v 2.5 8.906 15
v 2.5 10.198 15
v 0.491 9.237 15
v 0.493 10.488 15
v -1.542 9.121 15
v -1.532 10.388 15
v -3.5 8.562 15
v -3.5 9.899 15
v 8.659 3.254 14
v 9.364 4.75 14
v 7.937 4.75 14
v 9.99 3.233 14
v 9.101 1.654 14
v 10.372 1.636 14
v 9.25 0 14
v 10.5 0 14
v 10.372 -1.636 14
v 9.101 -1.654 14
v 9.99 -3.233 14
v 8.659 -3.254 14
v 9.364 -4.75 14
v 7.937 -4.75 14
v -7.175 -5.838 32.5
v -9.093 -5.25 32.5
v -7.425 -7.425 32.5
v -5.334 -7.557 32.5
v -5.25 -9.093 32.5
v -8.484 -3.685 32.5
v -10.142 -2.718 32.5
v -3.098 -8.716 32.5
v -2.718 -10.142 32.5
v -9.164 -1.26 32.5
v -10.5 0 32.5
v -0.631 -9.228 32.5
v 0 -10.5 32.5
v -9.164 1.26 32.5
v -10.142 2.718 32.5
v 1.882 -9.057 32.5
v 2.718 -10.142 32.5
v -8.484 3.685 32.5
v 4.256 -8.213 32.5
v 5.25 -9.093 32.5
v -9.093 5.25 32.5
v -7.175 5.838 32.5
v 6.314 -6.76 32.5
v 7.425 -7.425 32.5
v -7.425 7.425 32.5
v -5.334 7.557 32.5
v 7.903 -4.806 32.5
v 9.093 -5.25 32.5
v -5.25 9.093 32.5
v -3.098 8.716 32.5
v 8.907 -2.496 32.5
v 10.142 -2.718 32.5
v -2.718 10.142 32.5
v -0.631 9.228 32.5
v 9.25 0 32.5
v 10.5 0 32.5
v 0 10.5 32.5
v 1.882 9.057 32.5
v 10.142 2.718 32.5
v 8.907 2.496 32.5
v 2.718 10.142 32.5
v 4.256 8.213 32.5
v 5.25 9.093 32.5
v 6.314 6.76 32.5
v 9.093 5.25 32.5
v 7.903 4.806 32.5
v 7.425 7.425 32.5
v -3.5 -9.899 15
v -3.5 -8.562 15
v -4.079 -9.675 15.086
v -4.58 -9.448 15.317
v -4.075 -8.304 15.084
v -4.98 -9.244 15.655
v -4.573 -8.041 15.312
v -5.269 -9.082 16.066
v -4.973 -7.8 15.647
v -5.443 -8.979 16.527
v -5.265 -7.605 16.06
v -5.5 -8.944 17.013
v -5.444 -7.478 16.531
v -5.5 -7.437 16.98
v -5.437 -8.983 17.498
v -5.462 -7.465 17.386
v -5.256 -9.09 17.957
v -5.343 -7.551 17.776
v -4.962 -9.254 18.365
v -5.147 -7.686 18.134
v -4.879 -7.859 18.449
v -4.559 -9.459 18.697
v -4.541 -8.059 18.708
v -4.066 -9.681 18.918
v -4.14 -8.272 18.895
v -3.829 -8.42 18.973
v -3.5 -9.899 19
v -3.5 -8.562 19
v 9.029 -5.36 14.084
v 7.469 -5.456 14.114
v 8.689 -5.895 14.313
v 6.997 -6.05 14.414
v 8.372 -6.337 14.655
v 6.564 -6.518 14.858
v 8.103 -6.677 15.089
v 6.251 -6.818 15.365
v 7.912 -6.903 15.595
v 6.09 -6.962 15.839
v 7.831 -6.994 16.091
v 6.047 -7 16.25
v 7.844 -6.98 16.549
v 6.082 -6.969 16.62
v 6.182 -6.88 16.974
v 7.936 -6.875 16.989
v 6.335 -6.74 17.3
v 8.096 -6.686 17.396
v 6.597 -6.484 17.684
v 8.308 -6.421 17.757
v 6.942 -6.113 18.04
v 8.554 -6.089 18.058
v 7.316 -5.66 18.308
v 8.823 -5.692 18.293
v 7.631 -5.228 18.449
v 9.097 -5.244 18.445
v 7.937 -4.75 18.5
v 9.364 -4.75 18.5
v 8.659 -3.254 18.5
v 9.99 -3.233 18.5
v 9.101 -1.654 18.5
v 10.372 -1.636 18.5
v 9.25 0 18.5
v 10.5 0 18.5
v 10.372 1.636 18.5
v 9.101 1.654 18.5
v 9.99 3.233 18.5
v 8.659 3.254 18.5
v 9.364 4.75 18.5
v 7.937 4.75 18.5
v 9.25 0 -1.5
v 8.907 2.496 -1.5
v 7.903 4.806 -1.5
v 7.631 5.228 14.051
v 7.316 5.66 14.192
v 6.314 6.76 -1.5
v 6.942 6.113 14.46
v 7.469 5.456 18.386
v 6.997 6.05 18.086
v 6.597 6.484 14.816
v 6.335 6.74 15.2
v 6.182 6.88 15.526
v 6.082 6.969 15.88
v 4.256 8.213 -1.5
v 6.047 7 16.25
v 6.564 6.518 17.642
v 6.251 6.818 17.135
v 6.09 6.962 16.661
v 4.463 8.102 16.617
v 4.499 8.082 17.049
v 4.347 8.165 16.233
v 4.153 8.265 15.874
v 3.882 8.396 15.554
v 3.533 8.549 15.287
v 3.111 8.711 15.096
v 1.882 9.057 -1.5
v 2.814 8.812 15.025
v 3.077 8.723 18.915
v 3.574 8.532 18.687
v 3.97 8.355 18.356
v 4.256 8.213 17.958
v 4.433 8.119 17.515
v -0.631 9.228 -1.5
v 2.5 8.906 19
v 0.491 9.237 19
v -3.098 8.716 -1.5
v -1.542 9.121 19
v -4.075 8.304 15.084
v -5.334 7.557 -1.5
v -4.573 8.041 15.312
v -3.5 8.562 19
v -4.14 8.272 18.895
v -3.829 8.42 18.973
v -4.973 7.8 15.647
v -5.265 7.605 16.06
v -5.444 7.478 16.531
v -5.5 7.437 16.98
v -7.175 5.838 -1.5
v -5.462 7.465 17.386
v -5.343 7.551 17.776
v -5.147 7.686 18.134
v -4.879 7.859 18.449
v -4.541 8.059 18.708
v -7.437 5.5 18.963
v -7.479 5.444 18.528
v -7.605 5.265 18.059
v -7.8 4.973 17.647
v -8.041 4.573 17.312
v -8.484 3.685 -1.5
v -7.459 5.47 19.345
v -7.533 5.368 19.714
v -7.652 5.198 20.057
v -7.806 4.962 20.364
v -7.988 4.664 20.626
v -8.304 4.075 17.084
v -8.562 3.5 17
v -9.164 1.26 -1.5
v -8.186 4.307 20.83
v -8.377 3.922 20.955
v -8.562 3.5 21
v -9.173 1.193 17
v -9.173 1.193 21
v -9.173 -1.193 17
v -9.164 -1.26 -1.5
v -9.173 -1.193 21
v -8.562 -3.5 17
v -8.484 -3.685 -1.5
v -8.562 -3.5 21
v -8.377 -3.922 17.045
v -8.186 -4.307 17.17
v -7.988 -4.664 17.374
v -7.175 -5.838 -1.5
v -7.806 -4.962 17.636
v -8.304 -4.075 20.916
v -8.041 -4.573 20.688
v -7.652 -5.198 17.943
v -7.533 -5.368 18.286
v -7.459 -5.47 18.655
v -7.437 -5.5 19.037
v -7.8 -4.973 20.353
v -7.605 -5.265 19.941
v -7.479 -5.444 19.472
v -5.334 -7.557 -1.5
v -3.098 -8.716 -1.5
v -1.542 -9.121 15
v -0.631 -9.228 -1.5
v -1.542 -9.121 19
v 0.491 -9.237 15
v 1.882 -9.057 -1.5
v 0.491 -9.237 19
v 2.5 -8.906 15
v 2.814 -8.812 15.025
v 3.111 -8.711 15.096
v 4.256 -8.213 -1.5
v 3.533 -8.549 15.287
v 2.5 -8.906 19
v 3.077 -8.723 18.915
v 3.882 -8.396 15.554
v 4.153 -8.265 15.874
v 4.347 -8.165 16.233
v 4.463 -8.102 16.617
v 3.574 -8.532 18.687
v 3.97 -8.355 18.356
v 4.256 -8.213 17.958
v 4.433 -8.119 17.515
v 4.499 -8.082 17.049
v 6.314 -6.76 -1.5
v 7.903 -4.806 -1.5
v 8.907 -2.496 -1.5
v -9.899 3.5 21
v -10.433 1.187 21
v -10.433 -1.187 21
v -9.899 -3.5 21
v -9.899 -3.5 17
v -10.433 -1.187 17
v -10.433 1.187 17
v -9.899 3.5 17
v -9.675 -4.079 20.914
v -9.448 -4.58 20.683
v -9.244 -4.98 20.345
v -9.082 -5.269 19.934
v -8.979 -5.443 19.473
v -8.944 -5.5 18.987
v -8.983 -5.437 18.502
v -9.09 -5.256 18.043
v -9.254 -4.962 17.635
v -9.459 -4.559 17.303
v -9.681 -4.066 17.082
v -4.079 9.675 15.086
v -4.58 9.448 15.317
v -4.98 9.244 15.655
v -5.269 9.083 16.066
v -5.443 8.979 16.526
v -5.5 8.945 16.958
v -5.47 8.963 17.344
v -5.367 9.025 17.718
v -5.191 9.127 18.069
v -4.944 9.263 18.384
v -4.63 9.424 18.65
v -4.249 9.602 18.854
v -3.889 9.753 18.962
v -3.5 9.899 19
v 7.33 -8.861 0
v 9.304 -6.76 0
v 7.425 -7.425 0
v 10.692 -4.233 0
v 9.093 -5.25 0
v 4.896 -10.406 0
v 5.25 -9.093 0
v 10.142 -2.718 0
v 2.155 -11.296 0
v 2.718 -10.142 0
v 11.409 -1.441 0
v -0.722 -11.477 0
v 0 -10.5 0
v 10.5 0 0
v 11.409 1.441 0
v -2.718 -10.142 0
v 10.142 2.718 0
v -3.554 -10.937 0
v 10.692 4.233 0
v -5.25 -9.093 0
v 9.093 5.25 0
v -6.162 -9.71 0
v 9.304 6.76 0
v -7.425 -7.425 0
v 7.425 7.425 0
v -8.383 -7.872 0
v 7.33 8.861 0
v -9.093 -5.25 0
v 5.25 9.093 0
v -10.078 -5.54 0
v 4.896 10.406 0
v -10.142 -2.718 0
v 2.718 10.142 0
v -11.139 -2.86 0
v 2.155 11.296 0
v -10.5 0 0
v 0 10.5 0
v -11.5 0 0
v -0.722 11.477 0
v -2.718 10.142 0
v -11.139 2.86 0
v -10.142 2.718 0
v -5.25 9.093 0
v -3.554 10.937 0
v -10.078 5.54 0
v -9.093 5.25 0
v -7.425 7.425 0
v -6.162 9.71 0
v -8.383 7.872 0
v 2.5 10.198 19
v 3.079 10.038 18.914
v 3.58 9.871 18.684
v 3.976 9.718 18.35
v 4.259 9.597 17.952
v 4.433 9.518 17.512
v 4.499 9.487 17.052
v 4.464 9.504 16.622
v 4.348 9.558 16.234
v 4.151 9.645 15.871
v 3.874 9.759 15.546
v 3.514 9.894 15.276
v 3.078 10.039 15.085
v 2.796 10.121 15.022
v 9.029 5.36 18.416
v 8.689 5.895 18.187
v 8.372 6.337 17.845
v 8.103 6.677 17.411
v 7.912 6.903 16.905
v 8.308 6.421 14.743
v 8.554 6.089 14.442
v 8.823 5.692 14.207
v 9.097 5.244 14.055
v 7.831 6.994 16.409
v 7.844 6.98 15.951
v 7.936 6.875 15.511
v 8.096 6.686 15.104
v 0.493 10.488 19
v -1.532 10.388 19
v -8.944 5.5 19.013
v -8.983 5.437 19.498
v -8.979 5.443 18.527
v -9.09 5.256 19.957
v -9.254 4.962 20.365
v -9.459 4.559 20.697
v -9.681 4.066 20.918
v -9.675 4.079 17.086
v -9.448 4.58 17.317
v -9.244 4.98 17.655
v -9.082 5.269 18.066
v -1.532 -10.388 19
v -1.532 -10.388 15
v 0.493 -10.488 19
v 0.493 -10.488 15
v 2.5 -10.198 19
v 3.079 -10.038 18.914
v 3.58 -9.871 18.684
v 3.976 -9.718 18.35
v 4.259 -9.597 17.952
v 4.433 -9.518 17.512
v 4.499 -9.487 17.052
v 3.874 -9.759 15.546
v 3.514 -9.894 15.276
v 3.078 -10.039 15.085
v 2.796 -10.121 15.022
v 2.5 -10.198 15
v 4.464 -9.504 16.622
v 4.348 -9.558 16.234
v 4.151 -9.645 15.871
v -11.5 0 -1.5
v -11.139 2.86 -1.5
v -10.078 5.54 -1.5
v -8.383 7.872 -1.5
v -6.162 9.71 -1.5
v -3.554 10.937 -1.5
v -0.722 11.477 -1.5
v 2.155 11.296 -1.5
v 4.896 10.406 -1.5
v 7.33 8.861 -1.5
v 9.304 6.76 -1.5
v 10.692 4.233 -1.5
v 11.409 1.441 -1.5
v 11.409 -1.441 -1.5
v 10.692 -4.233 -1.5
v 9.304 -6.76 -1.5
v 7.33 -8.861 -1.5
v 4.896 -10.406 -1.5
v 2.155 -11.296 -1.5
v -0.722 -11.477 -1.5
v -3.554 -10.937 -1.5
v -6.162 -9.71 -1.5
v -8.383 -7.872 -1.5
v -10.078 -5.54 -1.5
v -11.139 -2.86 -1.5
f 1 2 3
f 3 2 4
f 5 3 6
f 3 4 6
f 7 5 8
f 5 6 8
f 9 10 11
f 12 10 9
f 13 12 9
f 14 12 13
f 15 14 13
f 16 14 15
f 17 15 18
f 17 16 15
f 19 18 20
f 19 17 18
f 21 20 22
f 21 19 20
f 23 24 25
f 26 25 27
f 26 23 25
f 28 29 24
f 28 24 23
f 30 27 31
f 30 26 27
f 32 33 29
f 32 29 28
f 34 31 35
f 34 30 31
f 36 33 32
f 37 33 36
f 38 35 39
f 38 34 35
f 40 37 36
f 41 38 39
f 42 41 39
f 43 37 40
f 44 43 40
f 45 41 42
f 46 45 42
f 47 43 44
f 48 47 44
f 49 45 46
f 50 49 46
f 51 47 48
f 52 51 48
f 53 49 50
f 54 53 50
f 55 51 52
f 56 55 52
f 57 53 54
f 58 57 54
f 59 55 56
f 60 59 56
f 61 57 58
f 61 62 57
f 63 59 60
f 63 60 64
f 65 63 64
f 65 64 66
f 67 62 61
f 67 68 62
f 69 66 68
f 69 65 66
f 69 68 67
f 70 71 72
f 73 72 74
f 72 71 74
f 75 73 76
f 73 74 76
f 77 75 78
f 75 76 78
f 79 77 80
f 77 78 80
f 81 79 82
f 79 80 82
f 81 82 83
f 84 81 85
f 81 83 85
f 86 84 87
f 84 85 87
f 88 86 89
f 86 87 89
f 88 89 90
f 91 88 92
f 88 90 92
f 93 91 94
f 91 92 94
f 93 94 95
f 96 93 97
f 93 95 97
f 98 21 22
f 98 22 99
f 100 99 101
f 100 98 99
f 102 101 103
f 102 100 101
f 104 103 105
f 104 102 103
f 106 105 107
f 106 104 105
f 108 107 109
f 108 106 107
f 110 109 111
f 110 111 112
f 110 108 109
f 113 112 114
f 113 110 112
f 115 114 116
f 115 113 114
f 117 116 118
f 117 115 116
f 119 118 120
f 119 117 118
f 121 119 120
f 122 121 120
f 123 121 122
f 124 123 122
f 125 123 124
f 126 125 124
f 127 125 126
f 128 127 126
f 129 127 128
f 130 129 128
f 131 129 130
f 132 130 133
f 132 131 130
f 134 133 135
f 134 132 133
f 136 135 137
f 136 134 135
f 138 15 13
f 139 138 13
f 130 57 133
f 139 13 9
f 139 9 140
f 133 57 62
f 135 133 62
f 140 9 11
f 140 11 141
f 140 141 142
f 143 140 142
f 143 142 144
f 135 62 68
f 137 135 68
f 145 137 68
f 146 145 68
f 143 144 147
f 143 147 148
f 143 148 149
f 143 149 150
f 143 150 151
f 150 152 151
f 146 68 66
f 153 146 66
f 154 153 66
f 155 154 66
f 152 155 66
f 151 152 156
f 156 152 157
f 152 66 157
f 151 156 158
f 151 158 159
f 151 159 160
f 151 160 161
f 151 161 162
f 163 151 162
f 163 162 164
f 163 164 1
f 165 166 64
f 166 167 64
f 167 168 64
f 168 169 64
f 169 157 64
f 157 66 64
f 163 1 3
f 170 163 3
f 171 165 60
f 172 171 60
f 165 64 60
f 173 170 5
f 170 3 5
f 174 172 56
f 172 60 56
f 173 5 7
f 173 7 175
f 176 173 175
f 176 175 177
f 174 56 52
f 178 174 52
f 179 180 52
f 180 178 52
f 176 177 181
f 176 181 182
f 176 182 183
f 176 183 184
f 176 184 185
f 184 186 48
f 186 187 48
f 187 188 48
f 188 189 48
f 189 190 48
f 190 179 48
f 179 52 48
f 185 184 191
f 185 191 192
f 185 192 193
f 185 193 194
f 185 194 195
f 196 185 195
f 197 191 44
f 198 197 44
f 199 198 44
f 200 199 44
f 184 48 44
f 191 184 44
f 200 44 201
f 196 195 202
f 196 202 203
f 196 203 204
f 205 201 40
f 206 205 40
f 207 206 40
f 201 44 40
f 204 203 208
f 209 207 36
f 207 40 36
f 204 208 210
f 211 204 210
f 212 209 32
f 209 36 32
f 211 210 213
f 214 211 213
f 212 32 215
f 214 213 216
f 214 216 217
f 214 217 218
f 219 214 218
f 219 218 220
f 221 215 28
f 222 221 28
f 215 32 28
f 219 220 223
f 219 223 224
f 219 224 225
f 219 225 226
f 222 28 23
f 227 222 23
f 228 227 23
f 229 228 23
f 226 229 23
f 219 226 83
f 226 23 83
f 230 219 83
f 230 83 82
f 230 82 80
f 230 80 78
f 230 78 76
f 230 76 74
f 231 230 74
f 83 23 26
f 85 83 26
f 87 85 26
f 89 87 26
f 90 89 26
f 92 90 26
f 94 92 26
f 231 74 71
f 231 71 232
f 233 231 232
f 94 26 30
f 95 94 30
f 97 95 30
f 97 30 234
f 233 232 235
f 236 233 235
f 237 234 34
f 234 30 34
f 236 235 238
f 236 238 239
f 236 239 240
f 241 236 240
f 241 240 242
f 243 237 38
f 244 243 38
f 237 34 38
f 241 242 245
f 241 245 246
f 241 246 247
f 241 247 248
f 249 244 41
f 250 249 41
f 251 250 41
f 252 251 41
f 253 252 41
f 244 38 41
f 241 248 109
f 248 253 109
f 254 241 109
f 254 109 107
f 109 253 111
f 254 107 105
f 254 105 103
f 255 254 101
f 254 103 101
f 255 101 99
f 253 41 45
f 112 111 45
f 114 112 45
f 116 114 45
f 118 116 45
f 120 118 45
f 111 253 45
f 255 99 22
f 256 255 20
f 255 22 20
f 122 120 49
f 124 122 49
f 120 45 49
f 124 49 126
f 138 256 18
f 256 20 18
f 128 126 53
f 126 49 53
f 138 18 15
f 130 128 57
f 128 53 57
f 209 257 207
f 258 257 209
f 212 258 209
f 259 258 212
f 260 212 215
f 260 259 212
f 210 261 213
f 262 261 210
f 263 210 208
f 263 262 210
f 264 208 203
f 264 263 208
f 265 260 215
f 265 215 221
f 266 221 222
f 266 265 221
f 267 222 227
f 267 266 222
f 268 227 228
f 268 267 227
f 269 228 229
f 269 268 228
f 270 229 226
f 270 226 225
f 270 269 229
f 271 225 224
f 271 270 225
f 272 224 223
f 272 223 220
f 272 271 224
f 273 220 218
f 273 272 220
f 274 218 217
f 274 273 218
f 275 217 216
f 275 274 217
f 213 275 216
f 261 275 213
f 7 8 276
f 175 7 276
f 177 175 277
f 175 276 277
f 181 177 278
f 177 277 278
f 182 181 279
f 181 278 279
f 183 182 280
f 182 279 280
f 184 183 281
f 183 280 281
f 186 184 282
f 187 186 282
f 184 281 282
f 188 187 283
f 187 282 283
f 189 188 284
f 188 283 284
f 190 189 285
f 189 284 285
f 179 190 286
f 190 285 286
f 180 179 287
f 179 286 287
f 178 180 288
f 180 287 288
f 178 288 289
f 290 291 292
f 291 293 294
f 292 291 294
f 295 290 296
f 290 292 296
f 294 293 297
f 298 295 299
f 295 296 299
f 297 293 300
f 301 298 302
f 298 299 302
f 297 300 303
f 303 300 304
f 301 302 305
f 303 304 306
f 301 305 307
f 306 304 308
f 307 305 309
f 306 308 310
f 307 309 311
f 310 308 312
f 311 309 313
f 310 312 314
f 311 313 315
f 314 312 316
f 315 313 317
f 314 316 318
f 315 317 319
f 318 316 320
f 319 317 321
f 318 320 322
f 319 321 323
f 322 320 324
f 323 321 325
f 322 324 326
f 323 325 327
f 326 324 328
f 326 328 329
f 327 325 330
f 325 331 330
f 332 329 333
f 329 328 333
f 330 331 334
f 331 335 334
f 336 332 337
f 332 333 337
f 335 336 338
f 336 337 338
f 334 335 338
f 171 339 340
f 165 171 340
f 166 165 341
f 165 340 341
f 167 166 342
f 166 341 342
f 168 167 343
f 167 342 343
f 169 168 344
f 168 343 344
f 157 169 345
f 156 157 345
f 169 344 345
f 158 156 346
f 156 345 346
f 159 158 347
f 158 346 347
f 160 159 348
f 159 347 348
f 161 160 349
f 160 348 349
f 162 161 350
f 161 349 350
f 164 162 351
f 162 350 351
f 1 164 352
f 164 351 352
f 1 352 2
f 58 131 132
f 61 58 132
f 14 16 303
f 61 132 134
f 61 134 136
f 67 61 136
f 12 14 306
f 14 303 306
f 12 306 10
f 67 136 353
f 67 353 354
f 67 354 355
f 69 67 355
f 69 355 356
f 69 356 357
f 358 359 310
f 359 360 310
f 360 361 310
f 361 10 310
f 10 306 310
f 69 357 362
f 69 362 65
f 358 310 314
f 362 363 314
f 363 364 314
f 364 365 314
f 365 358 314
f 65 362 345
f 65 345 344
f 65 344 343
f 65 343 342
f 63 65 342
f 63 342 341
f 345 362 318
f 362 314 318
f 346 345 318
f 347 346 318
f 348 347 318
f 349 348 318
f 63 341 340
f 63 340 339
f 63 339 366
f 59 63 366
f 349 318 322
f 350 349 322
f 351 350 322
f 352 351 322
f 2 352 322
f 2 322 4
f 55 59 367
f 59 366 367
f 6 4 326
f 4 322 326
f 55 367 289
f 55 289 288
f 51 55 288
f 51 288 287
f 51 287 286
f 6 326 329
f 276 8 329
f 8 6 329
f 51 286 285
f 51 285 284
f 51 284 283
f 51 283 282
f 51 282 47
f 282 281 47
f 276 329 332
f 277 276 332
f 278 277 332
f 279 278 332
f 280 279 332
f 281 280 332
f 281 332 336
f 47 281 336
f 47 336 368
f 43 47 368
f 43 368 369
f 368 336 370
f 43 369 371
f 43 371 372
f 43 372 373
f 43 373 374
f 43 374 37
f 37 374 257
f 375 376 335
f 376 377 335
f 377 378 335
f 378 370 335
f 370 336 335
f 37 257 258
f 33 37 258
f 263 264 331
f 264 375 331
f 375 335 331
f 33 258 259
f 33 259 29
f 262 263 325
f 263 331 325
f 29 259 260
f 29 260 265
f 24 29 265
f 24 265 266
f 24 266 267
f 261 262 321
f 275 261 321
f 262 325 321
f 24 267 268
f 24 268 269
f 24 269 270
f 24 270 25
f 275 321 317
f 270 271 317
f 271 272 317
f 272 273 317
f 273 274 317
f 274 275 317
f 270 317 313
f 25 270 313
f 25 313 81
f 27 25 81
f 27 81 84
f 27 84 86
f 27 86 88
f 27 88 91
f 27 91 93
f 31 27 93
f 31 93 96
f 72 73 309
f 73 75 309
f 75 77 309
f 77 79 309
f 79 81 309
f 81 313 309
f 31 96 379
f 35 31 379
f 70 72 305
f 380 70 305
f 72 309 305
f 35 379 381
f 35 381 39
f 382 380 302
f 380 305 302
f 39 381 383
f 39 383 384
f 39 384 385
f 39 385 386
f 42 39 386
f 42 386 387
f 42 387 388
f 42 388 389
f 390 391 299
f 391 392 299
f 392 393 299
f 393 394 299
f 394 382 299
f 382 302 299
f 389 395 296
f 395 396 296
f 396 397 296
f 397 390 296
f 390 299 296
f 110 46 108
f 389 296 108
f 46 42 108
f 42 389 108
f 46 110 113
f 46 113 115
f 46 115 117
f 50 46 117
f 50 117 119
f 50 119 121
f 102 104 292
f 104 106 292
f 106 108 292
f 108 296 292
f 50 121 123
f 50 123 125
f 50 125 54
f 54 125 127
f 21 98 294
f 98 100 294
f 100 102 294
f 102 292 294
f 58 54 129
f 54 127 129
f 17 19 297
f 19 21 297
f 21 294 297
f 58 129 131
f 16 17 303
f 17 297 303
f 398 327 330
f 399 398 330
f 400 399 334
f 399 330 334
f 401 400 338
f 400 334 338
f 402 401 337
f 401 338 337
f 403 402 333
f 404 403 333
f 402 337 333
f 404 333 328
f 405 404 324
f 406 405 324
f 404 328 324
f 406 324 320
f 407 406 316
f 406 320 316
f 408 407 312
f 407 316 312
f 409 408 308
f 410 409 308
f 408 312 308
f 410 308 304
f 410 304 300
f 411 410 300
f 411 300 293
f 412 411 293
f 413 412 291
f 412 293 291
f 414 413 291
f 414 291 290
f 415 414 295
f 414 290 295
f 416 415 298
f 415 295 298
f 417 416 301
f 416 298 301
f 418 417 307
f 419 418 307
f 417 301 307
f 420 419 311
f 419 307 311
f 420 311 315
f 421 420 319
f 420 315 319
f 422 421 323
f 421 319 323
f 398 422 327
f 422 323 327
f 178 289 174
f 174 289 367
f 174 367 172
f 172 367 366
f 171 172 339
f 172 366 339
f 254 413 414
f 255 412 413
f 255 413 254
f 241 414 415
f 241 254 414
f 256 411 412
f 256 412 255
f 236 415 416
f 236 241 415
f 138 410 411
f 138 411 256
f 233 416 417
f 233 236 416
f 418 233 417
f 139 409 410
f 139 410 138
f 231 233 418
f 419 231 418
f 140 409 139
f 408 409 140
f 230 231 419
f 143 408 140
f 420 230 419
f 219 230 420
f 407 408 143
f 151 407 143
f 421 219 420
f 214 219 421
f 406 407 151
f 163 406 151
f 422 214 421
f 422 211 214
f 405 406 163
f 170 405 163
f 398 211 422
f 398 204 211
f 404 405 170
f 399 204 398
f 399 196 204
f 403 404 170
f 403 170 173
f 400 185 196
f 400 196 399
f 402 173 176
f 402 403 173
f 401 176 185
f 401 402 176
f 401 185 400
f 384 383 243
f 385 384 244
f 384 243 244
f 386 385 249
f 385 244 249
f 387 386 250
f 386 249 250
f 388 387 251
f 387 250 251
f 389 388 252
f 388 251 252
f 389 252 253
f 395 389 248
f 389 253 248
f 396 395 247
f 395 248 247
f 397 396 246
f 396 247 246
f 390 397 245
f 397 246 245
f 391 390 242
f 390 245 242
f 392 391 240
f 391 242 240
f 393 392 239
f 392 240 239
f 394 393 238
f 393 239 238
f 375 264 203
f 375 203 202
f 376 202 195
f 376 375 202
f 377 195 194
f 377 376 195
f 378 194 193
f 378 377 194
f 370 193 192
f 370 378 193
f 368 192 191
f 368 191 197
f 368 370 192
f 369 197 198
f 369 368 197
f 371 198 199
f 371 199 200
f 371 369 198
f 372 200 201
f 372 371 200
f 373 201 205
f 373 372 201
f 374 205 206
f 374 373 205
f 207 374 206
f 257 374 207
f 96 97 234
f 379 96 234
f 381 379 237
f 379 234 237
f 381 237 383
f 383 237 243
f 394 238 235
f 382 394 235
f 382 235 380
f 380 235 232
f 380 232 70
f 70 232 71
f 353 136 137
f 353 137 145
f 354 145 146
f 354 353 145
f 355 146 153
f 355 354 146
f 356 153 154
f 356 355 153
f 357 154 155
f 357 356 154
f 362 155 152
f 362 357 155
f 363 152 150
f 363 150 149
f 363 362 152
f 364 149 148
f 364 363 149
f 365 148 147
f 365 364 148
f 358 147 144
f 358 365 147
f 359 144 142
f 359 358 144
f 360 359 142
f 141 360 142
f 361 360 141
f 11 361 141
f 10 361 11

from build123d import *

# Parameters (mm, degrees)
ESQUISSE1_R             = 10.5
BASE_EXTRUSION_DEPTH    = 32.5
ESQUISSE3_R             = 11.5
BOSS_EXTRU_1_DEPTH      = 1.5
ESQUISSE2_R             = 9.25
ENL_V_MAT_EXTRU_1_DEPTH = 38.68952109
ENL_V_MAT_EXTRU_2_REACH = 42.896
ENL_V_MAT_EXTRU_3_DEPTH = 41.896210173
ENL_V_MAT_EXTRU_5_REACH = 43.167


with BuildPart() as part:
    # Esquisse1 → Base-Extrusion (new body)
    with BuildSketch(Plane.XY):
        Circle(ESQUISSE1_R)
    extrude(amount=BASE_EXTRUSION_DEPTH)

    # Esquisse3 → Boss.-Extru.1 (add)
    with BuildSketch(Plane(origin=(0, 0, 0), x_dir=(-1, 0, 0), z_dir=(0, 0, -1))):
        Circle(ESQUISSE3_R)
    extrude(amount=BOSS_EXTRU_1_DEPTH)

    # Esquisse2 → Enlèv. mat.-Extru.1 (cut, through all)
    with BuildSketch(Plane.XY.offset(32.5)):
        Circle(ESQUISSE2_R)
    extrude(amount=-ENL_V_MAT_EXTRU_1_DEPTH, mode=Mode.SUBTRACT)

    # Esquisse4 → Enlèv. mat.-Extru.2 (cut, up to next)
    with BuildSketch(Plane(origin=(10.5, 0, 0), x_dir=(0, 0, -1), z_dir=(1, 0, 0)), mode=Mode.PRIVATE) as enl_v_mat_extru_2_sk1:
        with BuildLine():
            Line((-14, 4.75), (-14, -4.75))
            ThreePointArc((-14, -4.75), (-16.25, -7), (-18.5, -4.75))
            Line((-18.5, -4.75), (-18.5, 4.75))
            ThreePointArc((-18.5, 4.75), (-16.25, 7), (-14, 4.75))
        make_face()
    enl_v_mat_extru_2_tool1 = extrude(enl_v_mat_extru_2_sk1.sketch, amount=-ENL_V_MAT_EXTRU_2_REACH, mode=Mode.PRIVATE) & part.part
    add(enl_v_mat_extru_2_tool1.solids().sort_by_distance((10.5, 0, 16.25))[0], mode=Mode.SUBTRACT)

    # Esquisse5 → Enlèv. mat.-Extru.3 (cut, through all)
    with BuildSketch(Plane(origin=(0, 10.5, 0), x_dir=(-1, 0, 0), z_dir=(0, 1, 0))):
        with BuildLine():
            Line((3.5, 19), (-2.5, 19))
            ThreePointArc((-2.5, 19), (-4.5, 17), (-2.5, 15))
            Line((-2.5, 15), (3.5, 15))
            ThreePointArc((3.5, 15), (5.5, 17), (3.5, 19))
        make_face()
    extrude(amount=-ENL_V_MAT_EXTRU_3_DEPTH, mode=Mode.SUBTRACT)

    # Esquisse7 → Enlèv. mat.-Extru.5 (cut, up to next)
    with BuildSketch(Plane(origin=(-11, 0, 0), x_dir=(0, 0, -1), z_dir=(1, 0, 0)), mode=Mode.PRIVATE) as enl_v_mat_extru_5_sk1:
        with BuildLine():
            Line((-17, -3.5), (-17, 3.5))
            ThreePointArc((-17, 3.5), (-19, 5.5), (-21, 3.5))
            Line((-21, 3.5), (-21, -3.5))
            ThreePointArc((-21, -3.5), (-19, -5.5), (-17, -3.5))
        make_face()
    enl_v_mat_extru_5_tool1 = extrude(enl_v_mat_extru_5_sk1.sketch, amount=ENL_V_MAT_EXTRU_5_REACH, mode=Mode.PRIVATE) & part.part
    add(enl_v_mat_extru_5_tool1.solids().sort_by_distance((-11, 0, 19))[0], mode=Mode.SUBTRACT)


solid = part.part
